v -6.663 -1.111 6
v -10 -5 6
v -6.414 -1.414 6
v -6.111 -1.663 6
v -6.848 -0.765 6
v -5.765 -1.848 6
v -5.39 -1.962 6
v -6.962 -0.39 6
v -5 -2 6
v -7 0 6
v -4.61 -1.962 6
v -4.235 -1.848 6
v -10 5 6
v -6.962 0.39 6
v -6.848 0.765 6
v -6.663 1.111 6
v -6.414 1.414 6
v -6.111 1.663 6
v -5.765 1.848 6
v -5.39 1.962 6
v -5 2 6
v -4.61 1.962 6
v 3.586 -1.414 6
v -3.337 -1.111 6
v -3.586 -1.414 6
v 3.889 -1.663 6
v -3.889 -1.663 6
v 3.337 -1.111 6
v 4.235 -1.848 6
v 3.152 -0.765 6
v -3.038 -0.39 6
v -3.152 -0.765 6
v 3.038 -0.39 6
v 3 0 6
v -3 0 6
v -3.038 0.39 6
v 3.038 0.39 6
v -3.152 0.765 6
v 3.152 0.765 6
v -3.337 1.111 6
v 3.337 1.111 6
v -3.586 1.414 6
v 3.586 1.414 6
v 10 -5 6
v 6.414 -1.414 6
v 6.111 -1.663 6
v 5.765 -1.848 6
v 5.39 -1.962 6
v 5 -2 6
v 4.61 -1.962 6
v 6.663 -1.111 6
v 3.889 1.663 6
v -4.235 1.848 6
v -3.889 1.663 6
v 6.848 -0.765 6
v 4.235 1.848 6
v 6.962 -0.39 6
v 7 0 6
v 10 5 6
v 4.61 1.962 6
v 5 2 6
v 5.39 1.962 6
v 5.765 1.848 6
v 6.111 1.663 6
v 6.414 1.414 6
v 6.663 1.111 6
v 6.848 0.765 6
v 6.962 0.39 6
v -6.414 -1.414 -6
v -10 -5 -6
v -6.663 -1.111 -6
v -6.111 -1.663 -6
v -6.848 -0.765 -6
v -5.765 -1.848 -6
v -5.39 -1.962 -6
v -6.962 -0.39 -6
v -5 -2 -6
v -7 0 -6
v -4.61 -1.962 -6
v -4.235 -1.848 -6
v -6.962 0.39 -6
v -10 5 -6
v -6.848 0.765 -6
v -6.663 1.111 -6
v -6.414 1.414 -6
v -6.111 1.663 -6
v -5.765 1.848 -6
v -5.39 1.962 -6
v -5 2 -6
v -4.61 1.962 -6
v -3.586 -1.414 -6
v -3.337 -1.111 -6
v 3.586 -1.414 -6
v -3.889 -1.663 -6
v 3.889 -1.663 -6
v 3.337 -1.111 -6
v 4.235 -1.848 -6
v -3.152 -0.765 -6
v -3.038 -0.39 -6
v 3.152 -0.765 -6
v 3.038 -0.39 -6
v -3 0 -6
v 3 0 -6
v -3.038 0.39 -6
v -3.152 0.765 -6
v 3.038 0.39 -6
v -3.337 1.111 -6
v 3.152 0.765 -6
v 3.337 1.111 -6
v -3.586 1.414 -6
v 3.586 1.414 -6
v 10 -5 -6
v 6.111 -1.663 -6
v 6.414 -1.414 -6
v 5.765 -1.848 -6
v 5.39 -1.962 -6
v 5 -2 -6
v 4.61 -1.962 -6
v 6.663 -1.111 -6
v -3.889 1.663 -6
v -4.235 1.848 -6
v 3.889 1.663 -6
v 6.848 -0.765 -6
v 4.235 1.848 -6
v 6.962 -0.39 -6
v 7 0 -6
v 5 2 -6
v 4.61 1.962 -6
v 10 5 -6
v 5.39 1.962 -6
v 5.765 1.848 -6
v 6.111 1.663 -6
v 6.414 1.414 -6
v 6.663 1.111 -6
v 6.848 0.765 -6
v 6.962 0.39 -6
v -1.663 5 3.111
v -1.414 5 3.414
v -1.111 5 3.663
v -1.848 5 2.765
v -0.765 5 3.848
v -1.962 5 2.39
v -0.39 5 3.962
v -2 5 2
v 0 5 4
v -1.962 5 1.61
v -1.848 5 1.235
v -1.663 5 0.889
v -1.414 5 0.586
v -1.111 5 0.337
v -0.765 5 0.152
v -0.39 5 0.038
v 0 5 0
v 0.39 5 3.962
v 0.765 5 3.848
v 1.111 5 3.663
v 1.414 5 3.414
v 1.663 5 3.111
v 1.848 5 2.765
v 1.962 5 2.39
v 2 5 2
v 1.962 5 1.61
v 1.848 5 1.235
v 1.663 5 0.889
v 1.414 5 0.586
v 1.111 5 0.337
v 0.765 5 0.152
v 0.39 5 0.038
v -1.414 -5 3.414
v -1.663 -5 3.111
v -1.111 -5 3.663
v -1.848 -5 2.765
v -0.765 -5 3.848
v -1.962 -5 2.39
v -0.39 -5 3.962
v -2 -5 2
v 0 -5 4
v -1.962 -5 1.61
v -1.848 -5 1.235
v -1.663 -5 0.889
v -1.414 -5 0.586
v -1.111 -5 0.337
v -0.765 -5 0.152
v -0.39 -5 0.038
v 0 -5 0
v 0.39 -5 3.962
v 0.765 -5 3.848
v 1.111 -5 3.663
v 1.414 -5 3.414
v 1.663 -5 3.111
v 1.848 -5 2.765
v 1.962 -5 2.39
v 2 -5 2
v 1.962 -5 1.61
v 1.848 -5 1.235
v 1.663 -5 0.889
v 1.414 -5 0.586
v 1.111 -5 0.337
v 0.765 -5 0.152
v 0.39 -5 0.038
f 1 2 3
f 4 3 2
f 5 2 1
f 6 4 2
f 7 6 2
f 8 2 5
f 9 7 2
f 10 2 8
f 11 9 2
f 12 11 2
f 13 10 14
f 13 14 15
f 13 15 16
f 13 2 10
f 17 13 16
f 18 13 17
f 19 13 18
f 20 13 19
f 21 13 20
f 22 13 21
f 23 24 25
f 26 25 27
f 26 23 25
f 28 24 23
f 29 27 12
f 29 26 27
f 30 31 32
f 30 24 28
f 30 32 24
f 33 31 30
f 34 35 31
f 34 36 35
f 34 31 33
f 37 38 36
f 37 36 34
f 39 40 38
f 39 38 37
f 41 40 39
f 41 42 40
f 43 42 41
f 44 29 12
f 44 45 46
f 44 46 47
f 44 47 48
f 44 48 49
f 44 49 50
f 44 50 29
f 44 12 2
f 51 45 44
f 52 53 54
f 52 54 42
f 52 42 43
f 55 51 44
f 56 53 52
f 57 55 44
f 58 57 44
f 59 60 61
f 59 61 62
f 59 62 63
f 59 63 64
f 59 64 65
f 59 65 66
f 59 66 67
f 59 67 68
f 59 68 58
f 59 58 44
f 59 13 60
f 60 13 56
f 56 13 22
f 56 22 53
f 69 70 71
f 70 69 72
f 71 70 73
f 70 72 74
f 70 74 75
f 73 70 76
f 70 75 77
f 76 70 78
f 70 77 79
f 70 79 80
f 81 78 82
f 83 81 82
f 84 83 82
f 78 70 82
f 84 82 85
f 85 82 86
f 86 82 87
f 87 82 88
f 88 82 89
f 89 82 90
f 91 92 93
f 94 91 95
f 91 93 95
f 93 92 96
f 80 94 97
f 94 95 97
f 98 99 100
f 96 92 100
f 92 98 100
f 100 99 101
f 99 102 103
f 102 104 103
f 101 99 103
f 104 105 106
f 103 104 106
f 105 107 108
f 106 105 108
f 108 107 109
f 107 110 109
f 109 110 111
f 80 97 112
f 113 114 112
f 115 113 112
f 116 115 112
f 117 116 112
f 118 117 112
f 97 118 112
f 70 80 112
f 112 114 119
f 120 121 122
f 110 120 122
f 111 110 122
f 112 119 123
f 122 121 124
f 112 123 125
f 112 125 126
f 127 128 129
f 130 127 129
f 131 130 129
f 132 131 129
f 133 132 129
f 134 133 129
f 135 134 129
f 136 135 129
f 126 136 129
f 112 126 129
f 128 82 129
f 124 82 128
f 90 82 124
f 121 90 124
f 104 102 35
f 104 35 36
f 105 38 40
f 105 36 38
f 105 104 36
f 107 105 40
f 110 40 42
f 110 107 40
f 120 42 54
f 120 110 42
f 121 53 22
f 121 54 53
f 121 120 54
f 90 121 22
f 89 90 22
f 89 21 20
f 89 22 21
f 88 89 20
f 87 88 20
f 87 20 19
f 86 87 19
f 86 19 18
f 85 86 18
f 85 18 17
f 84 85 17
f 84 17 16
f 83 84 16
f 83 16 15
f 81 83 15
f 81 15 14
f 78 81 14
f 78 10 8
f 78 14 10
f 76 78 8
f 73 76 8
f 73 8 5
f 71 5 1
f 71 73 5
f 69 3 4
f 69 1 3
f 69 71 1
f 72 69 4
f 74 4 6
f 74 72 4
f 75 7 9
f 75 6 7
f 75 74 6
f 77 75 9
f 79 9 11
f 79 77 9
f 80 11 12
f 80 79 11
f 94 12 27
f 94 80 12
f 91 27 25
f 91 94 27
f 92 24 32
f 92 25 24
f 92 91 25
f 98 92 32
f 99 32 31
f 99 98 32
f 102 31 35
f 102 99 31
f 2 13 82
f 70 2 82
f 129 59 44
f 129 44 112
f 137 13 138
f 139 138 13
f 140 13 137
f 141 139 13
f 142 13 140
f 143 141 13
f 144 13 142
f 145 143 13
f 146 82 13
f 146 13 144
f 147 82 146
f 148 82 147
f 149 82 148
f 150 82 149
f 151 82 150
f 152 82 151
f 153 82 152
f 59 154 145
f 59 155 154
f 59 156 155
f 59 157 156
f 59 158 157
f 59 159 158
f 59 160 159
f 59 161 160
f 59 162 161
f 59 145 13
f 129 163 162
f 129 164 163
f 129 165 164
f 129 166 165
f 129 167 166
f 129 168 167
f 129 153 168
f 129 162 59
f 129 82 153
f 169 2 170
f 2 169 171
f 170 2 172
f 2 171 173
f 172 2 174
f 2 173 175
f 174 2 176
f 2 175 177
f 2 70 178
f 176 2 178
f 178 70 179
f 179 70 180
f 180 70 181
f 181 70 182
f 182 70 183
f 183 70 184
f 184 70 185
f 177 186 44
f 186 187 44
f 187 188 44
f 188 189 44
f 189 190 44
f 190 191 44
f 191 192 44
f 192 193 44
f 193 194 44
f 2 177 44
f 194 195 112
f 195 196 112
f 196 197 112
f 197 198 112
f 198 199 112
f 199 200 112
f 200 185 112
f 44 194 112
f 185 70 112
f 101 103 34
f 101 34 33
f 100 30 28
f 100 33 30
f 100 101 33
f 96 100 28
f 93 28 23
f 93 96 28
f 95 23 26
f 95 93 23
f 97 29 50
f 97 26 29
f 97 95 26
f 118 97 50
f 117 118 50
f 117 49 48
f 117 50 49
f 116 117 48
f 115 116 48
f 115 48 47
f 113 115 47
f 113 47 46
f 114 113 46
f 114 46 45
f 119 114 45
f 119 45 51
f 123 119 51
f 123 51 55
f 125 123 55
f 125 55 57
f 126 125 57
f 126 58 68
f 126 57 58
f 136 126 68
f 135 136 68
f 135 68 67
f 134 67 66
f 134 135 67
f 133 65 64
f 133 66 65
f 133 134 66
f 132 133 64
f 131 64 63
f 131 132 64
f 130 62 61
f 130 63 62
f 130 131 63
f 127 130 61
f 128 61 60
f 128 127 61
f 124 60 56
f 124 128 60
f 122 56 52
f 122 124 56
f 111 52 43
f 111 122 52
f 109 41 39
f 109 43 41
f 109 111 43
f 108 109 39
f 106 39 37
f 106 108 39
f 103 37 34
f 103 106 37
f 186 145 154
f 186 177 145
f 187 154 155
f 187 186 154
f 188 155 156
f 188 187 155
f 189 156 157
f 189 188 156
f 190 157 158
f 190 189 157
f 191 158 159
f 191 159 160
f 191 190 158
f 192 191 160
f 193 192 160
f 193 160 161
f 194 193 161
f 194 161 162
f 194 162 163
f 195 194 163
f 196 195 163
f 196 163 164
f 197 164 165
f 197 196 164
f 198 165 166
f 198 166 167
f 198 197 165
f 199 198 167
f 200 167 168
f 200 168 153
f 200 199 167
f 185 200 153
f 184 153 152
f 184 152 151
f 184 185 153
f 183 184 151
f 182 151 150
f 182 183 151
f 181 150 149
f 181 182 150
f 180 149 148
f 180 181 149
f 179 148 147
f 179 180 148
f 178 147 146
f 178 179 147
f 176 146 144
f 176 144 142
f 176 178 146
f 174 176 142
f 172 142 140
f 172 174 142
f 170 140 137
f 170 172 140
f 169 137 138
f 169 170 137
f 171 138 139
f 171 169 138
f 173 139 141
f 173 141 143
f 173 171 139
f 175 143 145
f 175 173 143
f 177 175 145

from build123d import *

# Parameters (mm, degrees)
SKETCH_1_W               = 20
SKETCH_1_H               = 12
SKETCH_1_R               = 2
EXTRUDE_1_DEPTH          = 5
CUT_EXTRUDE_1_DEPTH      = 13.68857754
CUT_EXTRUDE_1_DEPTH_BACK = 13.68857754
SKETCH_2_R               = 2


with BuildPart() as part:
    # 草图1 → 凸台-拉伸1 (new, symmetric)
    with BuildSketch(Plane(origin=(0, 0, 0), x_dir=(1, 0, 0), z_dir=(0, 1, 0))):
        Rectangle(SKETCH_1_W, SKETCH_1_H)
        with Locations(Location((0, -2, 0), (0, 0, 270))):
            Circle(SKETCH_1_R, mode=Mode.SUBTRACT)
    extrude(amount=EXTRUDE_1_DEPTH, both=True)

    # 草图2 → 切除-拉伸1 (cut, two sides: drawn at the far end of the back side and taken through both)
    with BuildSketch(Plane.XY.offset(-CUT_EXTRUDE_1_DEPTH_BACK)):
        with Locations((-5, 0)):
            Circle(SKETCH_2_R)
        with Locations(Location((5, 0, 0), (0, 0, 180))):
            Circle(SKETCH_2_R)
    extrude(amount=CUT_EXTRUDE_1_DEPTH + CUT_EXTRUDE_1_DEPTH_BACK, mode=Mode.SUBTRACT)


solid = part.part
